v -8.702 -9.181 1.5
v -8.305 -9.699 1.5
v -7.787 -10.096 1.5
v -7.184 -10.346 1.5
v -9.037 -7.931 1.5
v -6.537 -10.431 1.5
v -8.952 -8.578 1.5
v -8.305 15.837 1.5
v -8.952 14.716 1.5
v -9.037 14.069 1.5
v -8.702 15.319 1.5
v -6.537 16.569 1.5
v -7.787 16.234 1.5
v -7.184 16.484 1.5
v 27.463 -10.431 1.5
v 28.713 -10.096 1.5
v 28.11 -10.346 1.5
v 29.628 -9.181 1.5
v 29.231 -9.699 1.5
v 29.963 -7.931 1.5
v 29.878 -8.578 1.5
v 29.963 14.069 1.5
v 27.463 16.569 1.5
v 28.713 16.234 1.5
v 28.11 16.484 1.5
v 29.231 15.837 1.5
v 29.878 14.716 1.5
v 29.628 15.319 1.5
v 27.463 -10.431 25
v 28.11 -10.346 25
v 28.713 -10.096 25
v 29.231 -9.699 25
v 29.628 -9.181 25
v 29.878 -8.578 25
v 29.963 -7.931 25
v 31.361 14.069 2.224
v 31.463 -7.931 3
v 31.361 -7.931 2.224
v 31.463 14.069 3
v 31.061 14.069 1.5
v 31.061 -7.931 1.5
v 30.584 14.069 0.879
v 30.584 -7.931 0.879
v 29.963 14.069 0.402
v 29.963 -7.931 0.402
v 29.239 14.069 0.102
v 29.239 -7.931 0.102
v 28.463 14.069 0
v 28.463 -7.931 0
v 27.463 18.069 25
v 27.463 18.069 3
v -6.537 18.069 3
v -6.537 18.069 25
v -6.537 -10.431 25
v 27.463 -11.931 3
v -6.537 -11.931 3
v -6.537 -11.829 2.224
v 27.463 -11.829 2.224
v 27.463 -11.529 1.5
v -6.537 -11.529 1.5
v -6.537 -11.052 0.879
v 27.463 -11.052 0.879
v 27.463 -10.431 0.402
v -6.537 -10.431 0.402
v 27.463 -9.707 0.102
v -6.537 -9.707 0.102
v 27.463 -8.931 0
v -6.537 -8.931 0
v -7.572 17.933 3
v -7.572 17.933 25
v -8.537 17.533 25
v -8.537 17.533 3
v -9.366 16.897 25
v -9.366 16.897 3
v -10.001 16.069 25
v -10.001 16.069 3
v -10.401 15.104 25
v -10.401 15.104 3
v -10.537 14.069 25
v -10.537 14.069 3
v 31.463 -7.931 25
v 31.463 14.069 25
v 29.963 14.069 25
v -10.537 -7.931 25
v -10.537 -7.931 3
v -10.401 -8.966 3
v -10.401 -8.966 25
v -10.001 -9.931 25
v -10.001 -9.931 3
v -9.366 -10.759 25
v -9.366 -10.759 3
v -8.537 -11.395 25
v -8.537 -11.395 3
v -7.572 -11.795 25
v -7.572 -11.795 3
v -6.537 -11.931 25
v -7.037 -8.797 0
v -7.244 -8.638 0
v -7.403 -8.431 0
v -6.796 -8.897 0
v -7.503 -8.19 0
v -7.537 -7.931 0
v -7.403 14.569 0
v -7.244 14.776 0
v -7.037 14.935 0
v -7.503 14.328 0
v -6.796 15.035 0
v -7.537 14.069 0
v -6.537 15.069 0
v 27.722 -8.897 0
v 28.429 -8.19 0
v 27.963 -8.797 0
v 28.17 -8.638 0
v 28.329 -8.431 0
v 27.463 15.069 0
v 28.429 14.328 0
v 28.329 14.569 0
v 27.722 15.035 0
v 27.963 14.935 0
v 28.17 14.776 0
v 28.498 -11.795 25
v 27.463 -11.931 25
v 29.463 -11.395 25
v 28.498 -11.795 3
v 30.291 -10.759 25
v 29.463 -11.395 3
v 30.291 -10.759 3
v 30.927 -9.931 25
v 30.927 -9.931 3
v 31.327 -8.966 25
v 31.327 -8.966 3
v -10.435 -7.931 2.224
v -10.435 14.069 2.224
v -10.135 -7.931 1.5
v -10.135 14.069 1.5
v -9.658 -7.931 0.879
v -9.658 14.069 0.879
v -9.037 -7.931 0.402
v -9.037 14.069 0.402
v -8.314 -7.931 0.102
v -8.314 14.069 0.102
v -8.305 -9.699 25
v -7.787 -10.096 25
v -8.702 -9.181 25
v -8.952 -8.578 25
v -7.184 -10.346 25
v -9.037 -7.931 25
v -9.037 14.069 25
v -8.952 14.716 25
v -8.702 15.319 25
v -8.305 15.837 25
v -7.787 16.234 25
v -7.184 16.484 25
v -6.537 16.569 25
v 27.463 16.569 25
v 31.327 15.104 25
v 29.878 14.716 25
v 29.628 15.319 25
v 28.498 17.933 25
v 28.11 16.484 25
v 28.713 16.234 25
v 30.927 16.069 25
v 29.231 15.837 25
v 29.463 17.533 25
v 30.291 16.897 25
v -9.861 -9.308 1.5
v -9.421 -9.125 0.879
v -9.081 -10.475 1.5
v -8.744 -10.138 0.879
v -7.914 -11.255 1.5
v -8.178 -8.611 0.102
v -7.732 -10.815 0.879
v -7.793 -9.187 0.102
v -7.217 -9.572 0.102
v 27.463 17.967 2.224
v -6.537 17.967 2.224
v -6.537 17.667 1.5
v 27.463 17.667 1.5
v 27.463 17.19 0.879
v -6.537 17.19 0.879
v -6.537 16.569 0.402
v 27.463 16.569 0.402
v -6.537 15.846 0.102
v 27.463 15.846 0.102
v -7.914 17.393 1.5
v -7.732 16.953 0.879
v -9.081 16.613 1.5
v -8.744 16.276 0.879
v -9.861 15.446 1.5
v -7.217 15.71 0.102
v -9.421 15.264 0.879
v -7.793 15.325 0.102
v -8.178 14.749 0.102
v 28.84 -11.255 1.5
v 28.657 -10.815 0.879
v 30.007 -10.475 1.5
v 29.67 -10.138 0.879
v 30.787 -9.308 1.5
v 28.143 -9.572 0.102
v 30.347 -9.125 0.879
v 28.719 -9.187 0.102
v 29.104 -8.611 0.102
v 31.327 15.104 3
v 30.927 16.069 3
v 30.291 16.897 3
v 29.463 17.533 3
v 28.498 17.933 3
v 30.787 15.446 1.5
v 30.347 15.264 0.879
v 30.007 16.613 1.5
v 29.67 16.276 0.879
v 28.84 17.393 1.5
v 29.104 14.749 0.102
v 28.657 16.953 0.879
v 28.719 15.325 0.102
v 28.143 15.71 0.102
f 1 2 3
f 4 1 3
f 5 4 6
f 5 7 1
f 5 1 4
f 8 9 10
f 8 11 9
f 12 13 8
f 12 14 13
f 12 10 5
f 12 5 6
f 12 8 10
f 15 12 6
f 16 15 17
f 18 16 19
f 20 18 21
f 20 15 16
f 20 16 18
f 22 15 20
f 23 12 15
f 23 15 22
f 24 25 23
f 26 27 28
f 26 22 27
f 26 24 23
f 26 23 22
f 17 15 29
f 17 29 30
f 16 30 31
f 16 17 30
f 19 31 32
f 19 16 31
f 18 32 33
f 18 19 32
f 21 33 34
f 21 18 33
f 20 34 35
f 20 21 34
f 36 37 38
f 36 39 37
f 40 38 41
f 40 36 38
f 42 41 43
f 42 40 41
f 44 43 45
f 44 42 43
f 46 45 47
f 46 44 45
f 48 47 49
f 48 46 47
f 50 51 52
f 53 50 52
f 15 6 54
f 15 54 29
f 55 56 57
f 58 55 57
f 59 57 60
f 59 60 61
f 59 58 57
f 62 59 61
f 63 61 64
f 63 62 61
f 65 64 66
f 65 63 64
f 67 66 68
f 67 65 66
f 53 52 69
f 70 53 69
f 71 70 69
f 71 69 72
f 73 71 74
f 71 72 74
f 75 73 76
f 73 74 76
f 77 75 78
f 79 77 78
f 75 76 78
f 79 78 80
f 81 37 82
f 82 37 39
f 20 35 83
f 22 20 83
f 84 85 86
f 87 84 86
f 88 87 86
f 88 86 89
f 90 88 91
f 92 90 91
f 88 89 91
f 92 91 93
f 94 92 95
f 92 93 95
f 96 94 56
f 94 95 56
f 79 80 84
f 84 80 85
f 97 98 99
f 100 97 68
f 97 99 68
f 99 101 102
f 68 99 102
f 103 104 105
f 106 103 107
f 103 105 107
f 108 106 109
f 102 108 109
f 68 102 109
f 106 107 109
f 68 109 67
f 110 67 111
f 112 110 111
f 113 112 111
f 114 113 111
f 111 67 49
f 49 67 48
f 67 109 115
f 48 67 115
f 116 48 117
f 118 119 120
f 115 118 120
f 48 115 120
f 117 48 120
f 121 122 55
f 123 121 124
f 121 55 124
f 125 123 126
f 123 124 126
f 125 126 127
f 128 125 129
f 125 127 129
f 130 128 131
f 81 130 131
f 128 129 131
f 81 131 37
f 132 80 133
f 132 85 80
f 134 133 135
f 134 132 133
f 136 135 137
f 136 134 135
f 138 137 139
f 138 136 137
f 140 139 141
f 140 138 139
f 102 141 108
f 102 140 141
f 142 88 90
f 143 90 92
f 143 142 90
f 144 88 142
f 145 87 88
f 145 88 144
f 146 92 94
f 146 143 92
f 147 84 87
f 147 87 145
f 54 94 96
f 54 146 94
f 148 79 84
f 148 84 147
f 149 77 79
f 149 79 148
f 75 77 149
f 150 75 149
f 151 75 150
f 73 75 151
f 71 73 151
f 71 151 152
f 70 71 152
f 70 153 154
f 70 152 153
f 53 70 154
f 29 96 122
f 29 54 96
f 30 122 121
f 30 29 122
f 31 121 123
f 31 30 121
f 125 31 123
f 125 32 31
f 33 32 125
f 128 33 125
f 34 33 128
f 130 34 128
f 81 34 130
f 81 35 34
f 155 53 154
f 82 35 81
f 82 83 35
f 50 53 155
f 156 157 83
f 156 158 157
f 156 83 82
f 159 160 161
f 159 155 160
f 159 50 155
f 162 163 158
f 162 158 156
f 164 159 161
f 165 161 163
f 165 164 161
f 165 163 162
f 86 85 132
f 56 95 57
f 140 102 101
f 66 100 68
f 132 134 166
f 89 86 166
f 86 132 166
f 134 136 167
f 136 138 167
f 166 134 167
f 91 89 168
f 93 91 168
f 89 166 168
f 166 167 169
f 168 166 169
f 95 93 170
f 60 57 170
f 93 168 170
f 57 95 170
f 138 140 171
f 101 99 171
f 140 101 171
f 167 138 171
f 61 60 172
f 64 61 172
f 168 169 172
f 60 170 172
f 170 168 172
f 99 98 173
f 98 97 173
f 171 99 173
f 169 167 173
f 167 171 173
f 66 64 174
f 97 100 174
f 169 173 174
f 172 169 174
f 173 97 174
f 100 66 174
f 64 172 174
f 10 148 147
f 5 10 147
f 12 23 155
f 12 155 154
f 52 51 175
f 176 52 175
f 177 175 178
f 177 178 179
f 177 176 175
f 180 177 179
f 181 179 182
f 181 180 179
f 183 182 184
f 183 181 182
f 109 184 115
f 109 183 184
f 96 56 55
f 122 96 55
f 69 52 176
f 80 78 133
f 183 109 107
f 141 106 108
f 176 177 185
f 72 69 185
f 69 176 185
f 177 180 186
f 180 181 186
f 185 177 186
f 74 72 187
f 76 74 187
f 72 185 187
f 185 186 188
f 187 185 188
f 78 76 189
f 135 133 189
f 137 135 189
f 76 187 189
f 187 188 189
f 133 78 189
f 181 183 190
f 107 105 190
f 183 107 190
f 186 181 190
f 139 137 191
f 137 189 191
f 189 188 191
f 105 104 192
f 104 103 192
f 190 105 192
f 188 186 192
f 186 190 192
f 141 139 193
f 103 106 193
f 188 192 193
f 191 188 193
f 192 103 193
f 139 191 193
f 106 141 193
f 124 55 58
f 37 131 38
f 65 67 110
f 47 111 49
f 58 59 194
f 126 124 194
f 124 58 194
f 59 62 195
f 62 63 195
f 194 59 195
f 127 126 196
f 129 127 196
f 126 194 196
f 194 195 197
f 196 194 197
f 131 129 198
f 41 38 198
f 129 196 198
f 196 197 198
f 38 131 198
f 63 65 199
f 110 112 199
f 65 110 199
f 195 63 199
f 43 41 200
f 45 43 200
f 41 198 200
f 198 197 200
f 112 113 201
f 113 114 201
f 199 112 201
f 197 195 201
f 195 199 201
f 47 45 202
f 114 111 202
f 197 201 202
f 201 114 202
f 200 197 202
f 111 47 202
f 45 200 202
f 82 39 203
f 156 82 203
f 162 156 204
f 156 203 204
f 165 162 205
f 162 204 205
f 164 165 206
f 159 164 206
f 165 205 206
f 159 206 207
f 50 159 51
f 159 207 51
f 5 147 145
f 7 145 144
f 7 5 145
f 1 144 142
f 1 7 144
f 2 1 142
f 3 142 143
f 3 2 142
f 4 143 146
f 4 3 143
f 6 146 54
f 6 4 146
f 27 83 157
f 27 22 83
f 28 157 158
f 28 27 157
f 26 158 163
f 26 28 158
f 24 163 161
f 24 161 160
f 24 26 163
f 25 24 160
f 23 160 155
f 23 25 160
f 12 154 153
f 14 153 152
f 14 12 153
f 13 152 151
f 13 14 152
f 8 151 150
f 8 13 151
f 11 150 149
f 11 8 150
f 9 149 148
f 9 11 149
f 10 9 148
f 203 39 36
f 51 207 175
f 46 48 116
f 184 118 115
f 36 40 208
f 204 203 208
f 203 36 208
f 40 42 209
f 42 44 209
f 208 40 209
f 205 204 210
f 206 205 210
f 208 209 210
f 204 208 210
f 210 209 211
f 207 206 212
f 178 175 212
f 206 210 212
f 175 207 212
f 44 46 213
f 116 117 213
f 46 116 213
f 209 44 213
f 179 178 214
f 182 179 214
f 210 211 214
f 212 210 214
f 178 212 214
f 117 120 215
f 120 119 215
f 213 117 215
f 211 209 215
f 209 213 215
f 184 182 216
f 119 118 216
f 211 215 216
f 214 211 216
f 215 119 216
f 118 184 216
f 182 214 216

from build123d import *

# Parameters (mm, degrees)
F1_DEPTH = 25
F2_T     = -1.5
F3_R     = 3


with BuildPart() as f1:
    # F0 (on Top) → F1 (new body)
    with BuildSketch(Plane.XY):
        with BuildLine():
            Line((27.462885, 18.069044), (-6.537115, 18.069044))
            ThreePointArc((-6.537115, 18.069044), (-9.365542, 16.897471), (-10.537115, 14.069044))
            Line((-10.537115, 14.069044), (-10.537115, -7.930956))
            ThreePointArc((-10.537115, -7.930956), (-9.365542, -10.759383), (-6.537115, -11.930956))
            Line((-6.537115, -11.930956), (27.462885, -11.930956))
            ThreePointArc((27.462885, -11.930956), (30.291312, -10.759383), (31.462885, -7.930956))
            Line((31.462885, -7.930956), (31.462885, 14.069044))
            ThreePointArc((31.462885, 14.069044), (30.291312, 16.897471), (27.462885, 18.069044))
        make_face()
    extrude(amount=F1_DEPTH)

    # F2
    f2_openings = [f1.faces().sort_by_distance(p)[0] for p in [
        (10.462885, 3.069044, 25),
    ]]
    offset(amount=F2_T, openings=f2_openings)

    # F3
    f3_edges = [f1.edges().sort_by_distance(p)[0] for p in [
        (10.462885, -11.930956, 0),
    ]]
    fillet(f3_edges, radius=F3_R)


solid = f1.part
